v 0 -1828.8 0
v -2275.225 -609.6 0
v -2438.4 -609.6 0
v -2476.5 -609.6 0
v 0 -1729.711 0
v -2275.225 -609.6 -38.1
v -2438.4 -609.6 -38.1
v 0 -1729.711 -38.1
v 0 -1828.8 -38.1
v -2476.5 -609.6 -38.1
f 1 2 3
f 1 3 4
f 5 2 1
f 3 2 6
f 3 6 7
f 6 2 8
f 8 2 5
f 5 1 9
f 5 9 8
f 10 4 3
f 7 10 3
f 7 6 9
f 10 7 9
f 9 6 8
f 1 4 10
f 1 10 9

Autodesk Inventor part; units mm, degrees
ref_plane "YZ Plane" through (0, 0, 0) normal (1, 0, 0) x (0, 1, 0)
ref_plane "XZ Plane" through (0, 0, 0) normal (0, 1, 0) x (-1, 0, 0)
ref_plane "XY Plane" through (0, 0, 0) normal (0, 0, 1) x (1, 0, 0)
sketch "Sketch1" plane through (0, 0, 0) normal (0, 0, 1) x (1, 0, 0)
  line L0 (0, -609.6) -> (-2438.4, -609.6) projected
  line L1 (0, -1828.8) -> (0, 1828.8) projected
  line L2 (-2476.5, -609.6) -> (-2438.4, -609.6) projected
  line L3 (-2476.5, -609.6) -> (0, -1828.8)
  line L4 (-2476.5, -609.6) -> (-2275.2249, -609.6)
  line L5 (-2275.2249, -609.6) -> (0, -1729.7107)
  line L6 (0, -1729.7107) -> (0, -1828.8)
  point P0 (0, 0)
  dimension "d0" = 88.9
extrude "Extrusion1" add sketch "Sketch1" against normal blind 38.1 contours L5 L1 L3 L2 L0
properties part number "s48x2x4a"
